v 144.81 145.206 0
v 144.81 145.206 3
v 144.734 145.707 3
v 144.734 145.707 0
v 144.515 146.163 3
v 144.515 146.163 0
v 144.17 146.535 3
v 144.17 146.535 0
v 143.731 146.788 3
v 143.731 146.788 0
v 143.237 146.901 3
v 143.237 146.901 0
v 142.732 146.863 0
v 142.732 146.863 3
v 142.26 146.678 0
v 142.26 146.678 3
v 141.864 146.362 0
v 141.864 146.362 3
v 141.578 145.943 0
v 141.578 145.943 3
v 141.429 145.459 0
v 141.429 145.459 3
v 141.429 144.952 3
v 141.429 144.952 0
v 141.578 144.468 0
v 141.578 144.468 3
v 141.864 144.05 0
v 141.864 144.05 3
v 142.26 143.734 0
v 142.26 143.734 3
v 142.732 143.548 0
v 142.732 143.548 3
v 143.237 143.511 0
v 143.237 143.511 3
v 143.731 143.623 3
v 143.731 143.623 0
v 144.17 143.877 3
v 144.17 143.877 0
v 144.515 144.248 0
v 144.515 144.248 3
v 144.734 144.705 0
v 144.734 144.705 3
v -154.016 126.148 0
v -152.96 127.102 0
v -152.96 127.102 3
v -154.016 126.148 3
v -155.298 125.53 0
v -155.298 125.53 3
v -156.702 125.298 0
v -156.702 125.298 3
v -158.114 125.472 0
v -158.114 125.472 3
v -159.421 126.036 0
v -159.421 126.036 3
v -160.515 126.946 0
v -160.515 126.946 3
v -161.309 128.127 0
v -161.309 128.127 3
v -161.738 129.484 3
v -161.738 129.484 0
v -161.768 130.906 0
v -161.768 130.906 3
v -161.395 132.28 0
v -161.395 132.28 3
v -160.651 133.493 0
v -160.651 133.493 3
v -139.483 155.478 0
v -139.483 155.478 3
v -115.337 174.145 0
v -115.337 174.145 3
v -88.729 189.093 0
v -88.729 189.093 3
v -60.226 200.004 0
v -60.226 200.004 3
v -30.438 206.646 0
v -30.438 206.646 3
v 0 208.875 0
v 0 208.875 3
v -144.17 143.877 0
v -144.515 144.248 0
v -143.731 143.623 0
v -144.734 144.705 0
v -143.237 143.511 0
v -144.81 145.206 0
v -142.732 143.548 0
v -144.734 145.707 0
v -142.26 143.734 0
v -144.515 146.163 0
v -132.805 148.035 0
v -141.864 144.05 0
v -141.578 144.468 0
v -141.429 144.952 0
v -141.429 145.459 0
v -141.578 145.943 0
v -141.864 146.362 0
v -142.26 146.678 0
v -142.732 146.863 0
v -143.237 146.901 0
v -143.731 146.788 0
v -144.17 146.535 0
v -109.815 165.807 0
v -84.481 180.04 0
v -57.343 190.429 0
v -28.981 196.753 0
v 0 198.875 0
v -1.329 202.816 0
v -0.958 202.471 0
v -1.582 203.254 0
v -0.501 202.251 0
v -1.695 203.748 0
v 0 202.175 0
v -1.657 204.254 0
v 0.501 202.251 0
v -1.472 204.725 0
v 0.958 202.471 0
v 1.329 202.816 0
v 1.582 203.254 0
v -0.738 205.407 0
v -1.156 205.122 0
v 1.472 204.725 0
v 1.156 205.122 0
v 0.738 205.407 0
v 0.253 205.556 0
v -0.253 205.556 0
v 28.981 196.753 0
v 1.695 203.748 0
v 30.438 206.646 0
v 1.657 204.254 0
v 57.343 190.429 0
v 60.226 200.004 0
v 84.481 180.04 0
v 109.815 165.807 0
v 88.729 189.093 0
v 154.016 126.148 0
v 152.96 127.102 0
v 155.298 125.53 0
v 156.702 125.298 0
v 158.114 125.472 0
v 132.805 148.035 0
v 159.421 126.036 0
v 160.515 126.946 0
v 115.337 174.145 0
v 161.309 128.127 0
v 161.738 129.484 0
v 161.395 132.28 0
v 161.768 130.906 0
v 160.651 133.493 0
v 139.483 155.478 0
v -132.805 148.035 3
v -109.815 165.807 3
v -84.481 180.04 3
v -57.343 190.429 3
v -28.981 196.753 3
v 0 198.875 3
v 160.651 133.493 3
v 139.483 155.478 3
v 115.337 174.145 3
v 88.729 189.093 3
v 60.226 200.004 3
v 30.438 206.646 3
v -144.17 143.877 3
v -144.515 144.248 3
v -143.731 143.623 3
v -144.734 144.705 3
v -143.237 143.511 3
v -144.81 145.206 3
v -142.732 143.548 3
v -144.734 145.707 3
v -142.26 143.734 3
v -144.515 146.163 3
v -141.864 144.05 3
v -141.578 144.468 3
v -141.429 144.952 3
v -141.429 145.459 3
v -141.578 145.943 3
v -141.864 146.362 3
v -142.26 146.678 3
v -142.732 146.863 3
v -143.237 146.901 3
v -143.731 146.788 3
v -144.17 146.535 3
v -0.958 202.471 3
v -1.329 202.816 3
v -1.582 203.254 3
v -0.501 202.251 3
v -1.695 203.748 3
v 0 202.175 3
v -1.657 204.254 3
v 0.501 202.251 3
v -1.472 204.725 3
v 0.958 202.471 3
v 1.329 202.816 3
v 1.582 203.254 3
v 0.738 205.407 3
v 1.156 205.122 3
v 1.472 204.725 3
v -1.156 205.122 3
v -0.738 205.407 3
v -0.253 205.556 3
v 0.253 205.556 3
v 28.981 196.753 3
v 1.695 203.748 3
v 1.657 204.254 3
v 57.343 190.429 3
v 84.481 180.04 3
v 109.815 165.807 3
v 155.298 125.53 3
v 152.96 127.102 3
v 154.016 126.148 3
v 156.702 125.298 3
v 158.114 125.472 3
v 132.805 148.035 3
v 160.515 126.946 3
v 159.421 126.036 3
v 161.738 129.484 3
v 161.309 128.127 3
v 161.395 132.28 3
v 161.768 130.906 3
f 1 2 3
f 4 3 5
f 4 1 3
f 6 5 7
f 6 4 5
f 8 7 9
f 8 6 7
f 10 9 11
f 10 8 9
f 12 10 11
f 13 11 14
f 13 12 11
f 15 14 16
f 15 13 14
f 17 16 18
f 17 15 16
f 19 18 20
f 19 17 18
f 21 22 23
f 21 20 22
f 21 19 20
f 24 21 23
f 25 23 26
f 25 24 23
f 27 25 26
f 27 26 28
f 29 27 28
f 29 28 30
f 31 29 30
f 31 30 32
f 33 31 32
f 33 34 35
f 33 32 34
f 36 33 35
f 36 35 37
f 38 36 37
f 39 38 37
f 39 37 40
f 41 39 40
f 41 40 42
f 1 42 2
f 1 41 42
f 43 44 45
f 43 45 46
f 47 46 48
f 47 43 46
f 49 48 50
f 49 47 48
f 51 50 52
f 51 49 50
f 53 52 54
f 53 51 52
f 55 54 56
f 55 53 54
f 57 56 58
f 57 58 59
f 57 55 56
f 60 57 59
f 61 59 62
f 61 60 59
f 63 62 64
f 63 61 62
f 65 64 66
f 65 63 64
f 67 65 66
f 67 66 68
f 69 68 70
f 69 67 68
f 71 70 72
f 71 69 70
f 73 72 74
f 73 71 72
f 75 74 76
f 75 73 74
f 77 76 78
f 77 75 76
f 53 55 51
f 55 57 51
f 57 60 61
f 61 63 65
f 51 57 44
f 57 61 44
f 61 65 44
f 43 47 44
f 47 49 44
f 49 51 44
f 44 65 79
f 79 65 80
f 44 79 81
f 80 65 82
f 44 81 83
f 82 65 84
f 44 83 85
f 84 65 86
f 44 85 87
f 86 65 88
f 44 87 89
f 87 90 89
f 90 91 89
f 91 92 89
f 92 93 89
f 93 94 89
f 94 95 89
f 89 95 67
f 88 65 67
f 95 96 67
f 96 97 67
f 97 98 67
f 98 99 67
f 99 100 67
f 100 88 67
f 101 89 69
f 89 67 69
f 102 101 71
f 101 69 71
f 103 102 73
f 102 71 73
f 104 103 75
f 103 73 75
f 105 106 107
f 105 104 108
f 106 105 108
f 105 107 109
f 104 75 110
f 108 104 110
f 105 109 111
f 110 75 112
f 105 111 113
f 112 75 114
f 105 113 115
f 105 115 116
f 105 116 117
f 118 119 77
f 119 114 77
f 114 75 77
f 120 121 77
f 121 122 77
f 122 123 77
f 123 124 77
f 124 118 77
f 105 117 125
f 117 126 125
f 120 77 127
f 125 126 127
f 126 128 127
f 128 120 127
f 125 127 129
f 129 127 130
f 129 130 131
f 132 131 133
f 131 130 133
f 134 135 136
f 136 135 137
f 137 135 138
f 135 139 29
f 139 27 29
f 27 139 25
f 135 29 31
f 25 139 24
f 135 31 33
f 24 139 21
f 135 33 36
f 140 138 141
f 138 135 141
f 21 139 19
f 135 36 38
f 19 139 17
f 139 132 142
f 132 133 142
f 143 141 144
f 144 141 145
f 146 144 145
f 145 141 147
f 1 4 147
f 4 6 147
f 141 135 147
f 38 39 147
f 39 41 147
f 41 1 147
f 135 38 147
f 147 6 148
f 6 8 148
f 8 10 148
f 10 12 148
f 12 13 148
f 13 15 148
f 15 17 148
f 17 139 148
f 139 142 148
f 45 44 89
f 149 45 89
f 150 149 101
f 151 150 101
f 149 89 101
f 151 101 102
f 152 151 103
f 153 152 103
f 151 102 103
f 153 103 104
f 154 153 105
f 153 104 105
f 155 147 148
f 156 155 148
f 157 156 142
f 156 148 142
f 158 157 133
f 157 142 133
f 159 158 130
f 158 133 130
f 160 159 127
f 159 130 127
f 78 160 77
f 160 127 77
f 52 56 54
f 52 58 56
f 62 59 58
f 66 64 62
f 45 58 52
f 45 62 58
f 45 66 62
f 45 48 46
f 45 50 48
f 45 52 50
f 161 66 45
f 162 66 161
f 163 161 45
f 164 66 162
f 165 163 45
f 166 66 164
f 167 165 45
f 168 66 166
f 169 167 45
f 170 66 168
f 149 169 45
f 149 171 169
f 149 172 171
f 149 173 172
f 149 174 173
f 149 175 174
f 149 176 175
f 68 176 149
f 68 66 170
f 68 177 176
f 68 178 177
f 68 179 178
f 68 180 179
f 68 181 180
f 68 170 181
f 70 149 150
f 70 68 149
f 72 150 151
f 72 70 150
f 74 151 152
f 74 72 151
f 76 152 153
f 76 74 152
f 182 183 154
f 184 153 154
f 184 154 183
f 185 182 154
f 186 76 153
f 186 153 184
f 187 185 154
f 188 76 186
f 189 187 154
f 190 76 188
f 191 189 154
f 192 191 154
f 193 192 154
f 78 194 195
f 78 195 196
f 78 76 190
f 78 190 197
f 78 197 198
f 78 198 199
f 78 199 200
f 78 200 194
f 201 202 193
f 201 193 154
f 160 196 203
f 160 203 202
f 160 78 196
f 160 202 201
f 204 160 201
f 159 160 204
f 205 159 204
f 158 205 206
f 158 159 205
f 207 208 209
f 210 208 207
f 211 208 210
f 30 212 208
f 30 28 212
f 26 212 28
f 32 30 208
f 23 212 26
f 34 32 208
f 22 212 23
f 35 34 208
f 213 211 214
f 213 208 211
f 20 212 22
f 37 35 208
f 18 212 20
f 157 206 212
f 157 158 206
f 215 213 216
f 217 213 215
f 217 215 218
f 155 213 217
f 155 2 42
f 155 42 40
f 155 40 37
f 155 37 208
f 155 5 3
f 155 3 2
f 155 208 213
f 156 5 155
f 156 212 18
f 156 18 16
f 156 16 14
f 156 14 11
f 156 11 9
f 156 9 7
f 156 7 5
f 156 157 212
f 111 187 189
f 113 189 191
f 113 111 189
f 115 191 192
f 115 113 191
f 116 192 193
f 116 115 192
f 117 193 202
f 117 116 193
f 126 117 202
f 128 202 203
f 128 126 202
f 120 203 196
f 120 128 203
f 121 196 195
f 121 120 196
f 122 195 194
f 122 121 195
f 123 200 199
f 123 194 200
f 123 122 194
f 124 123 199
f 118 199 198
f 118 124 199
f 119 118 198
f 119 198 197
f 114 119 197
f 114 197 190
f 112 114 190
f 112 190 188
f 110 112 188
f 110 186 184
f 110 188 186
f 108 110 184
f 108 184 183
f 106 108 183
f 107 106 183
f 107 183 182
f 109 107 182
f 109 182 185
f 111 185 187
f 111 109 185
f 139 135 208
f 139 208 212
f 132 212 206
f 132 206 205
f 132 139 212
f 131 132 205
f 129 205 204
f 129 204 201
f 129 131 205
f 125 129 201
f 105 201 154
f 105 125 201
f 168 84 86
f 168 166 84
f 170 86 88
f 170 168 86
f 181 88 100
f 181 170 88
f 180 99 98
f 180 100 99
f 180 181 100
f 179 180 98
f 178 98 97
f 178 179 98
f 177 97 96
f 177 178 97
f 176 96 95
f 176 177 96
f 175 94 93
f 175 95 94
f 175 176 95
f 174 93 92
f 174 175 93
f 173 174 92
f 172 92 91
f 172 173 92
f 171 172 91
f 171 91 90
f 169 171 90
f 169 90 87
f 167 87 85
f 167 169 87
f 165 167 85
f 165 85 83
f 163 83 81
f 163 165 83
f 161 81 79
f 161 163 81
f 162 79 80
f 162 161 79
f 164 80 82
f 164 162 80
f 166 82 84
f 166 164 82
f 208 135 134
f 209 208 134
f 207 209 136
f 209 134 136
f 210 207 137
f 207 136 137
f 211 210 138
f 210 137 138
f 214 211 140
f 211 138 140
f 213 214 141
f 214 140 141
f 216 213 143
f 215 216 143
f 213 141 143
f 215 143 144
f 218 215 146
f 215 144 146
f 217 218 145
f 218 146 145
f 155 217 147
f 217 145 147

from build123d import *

# Parameters (mm, degrees)
PAD014_DEPTH         = 3
SKETCH055_R          = 1.7
POCKET019_DEPTH      = 364.282338
POCKET019_DEPTH_BACK = 367.282338


with BuildPart() as part:
    # Sketch052 → Pad014 (new body)
    with BuildSketch(Plane.XY):
        with BuildLine():
            ThreePointArc((152.959511, 127.101705), (84.480895, 180.040089), (0, 198.875477))
            Line((0, 198.875477), (0, 208.875477))
            ThreePointArc((160.650731, 133.492724), (88.728824, 189.092995), (0, 208.875477))
            ThreePointArc((152.959511, 127.101705), (160.000631, 126.451604), (160.650731, 133.492724))
        make_face()
    pad014 = extrude(amount=PAD014_DEPTH)

    # Sketch055 → Pocket019 (cut, two sides)
    with BuildSketch(Plane.XY) as pocket019_sk:
        with Locations((143.11, 145.205847)):
            Circle(SKETCH055_R)
        with BuildLine():
            Line((0, 202.175477), (0, 205.575477))
            ThreePointArc((0, 202.175477), (1.7, 203.875477), (0, 205.575477))
        make_face()
    pocket019 = extrude(amount=-POCKET019_DEPTH, mode=Mode.SUBTRACT) + extrude(pocket019_sk.sketch, amount=POCKET019_DEPTH_BACK, mode=Mode.SUBTRACT)

    # Mirrored019: Pad014, Pocket019 across Sketch052 V_Axis
    add(pad014.mirror(Plane(origin=(0, 0, 0), x_dir=(0, 0, 1), z_dir=(1, 0, 0))))
    add(pocket019.mirror(Plane(origin=(0, 0, 0), x_dir=(0, 0, 1), z_dir=(1, 0, 0))), mode=Mode.SUBTRACT)


solid = part.part
